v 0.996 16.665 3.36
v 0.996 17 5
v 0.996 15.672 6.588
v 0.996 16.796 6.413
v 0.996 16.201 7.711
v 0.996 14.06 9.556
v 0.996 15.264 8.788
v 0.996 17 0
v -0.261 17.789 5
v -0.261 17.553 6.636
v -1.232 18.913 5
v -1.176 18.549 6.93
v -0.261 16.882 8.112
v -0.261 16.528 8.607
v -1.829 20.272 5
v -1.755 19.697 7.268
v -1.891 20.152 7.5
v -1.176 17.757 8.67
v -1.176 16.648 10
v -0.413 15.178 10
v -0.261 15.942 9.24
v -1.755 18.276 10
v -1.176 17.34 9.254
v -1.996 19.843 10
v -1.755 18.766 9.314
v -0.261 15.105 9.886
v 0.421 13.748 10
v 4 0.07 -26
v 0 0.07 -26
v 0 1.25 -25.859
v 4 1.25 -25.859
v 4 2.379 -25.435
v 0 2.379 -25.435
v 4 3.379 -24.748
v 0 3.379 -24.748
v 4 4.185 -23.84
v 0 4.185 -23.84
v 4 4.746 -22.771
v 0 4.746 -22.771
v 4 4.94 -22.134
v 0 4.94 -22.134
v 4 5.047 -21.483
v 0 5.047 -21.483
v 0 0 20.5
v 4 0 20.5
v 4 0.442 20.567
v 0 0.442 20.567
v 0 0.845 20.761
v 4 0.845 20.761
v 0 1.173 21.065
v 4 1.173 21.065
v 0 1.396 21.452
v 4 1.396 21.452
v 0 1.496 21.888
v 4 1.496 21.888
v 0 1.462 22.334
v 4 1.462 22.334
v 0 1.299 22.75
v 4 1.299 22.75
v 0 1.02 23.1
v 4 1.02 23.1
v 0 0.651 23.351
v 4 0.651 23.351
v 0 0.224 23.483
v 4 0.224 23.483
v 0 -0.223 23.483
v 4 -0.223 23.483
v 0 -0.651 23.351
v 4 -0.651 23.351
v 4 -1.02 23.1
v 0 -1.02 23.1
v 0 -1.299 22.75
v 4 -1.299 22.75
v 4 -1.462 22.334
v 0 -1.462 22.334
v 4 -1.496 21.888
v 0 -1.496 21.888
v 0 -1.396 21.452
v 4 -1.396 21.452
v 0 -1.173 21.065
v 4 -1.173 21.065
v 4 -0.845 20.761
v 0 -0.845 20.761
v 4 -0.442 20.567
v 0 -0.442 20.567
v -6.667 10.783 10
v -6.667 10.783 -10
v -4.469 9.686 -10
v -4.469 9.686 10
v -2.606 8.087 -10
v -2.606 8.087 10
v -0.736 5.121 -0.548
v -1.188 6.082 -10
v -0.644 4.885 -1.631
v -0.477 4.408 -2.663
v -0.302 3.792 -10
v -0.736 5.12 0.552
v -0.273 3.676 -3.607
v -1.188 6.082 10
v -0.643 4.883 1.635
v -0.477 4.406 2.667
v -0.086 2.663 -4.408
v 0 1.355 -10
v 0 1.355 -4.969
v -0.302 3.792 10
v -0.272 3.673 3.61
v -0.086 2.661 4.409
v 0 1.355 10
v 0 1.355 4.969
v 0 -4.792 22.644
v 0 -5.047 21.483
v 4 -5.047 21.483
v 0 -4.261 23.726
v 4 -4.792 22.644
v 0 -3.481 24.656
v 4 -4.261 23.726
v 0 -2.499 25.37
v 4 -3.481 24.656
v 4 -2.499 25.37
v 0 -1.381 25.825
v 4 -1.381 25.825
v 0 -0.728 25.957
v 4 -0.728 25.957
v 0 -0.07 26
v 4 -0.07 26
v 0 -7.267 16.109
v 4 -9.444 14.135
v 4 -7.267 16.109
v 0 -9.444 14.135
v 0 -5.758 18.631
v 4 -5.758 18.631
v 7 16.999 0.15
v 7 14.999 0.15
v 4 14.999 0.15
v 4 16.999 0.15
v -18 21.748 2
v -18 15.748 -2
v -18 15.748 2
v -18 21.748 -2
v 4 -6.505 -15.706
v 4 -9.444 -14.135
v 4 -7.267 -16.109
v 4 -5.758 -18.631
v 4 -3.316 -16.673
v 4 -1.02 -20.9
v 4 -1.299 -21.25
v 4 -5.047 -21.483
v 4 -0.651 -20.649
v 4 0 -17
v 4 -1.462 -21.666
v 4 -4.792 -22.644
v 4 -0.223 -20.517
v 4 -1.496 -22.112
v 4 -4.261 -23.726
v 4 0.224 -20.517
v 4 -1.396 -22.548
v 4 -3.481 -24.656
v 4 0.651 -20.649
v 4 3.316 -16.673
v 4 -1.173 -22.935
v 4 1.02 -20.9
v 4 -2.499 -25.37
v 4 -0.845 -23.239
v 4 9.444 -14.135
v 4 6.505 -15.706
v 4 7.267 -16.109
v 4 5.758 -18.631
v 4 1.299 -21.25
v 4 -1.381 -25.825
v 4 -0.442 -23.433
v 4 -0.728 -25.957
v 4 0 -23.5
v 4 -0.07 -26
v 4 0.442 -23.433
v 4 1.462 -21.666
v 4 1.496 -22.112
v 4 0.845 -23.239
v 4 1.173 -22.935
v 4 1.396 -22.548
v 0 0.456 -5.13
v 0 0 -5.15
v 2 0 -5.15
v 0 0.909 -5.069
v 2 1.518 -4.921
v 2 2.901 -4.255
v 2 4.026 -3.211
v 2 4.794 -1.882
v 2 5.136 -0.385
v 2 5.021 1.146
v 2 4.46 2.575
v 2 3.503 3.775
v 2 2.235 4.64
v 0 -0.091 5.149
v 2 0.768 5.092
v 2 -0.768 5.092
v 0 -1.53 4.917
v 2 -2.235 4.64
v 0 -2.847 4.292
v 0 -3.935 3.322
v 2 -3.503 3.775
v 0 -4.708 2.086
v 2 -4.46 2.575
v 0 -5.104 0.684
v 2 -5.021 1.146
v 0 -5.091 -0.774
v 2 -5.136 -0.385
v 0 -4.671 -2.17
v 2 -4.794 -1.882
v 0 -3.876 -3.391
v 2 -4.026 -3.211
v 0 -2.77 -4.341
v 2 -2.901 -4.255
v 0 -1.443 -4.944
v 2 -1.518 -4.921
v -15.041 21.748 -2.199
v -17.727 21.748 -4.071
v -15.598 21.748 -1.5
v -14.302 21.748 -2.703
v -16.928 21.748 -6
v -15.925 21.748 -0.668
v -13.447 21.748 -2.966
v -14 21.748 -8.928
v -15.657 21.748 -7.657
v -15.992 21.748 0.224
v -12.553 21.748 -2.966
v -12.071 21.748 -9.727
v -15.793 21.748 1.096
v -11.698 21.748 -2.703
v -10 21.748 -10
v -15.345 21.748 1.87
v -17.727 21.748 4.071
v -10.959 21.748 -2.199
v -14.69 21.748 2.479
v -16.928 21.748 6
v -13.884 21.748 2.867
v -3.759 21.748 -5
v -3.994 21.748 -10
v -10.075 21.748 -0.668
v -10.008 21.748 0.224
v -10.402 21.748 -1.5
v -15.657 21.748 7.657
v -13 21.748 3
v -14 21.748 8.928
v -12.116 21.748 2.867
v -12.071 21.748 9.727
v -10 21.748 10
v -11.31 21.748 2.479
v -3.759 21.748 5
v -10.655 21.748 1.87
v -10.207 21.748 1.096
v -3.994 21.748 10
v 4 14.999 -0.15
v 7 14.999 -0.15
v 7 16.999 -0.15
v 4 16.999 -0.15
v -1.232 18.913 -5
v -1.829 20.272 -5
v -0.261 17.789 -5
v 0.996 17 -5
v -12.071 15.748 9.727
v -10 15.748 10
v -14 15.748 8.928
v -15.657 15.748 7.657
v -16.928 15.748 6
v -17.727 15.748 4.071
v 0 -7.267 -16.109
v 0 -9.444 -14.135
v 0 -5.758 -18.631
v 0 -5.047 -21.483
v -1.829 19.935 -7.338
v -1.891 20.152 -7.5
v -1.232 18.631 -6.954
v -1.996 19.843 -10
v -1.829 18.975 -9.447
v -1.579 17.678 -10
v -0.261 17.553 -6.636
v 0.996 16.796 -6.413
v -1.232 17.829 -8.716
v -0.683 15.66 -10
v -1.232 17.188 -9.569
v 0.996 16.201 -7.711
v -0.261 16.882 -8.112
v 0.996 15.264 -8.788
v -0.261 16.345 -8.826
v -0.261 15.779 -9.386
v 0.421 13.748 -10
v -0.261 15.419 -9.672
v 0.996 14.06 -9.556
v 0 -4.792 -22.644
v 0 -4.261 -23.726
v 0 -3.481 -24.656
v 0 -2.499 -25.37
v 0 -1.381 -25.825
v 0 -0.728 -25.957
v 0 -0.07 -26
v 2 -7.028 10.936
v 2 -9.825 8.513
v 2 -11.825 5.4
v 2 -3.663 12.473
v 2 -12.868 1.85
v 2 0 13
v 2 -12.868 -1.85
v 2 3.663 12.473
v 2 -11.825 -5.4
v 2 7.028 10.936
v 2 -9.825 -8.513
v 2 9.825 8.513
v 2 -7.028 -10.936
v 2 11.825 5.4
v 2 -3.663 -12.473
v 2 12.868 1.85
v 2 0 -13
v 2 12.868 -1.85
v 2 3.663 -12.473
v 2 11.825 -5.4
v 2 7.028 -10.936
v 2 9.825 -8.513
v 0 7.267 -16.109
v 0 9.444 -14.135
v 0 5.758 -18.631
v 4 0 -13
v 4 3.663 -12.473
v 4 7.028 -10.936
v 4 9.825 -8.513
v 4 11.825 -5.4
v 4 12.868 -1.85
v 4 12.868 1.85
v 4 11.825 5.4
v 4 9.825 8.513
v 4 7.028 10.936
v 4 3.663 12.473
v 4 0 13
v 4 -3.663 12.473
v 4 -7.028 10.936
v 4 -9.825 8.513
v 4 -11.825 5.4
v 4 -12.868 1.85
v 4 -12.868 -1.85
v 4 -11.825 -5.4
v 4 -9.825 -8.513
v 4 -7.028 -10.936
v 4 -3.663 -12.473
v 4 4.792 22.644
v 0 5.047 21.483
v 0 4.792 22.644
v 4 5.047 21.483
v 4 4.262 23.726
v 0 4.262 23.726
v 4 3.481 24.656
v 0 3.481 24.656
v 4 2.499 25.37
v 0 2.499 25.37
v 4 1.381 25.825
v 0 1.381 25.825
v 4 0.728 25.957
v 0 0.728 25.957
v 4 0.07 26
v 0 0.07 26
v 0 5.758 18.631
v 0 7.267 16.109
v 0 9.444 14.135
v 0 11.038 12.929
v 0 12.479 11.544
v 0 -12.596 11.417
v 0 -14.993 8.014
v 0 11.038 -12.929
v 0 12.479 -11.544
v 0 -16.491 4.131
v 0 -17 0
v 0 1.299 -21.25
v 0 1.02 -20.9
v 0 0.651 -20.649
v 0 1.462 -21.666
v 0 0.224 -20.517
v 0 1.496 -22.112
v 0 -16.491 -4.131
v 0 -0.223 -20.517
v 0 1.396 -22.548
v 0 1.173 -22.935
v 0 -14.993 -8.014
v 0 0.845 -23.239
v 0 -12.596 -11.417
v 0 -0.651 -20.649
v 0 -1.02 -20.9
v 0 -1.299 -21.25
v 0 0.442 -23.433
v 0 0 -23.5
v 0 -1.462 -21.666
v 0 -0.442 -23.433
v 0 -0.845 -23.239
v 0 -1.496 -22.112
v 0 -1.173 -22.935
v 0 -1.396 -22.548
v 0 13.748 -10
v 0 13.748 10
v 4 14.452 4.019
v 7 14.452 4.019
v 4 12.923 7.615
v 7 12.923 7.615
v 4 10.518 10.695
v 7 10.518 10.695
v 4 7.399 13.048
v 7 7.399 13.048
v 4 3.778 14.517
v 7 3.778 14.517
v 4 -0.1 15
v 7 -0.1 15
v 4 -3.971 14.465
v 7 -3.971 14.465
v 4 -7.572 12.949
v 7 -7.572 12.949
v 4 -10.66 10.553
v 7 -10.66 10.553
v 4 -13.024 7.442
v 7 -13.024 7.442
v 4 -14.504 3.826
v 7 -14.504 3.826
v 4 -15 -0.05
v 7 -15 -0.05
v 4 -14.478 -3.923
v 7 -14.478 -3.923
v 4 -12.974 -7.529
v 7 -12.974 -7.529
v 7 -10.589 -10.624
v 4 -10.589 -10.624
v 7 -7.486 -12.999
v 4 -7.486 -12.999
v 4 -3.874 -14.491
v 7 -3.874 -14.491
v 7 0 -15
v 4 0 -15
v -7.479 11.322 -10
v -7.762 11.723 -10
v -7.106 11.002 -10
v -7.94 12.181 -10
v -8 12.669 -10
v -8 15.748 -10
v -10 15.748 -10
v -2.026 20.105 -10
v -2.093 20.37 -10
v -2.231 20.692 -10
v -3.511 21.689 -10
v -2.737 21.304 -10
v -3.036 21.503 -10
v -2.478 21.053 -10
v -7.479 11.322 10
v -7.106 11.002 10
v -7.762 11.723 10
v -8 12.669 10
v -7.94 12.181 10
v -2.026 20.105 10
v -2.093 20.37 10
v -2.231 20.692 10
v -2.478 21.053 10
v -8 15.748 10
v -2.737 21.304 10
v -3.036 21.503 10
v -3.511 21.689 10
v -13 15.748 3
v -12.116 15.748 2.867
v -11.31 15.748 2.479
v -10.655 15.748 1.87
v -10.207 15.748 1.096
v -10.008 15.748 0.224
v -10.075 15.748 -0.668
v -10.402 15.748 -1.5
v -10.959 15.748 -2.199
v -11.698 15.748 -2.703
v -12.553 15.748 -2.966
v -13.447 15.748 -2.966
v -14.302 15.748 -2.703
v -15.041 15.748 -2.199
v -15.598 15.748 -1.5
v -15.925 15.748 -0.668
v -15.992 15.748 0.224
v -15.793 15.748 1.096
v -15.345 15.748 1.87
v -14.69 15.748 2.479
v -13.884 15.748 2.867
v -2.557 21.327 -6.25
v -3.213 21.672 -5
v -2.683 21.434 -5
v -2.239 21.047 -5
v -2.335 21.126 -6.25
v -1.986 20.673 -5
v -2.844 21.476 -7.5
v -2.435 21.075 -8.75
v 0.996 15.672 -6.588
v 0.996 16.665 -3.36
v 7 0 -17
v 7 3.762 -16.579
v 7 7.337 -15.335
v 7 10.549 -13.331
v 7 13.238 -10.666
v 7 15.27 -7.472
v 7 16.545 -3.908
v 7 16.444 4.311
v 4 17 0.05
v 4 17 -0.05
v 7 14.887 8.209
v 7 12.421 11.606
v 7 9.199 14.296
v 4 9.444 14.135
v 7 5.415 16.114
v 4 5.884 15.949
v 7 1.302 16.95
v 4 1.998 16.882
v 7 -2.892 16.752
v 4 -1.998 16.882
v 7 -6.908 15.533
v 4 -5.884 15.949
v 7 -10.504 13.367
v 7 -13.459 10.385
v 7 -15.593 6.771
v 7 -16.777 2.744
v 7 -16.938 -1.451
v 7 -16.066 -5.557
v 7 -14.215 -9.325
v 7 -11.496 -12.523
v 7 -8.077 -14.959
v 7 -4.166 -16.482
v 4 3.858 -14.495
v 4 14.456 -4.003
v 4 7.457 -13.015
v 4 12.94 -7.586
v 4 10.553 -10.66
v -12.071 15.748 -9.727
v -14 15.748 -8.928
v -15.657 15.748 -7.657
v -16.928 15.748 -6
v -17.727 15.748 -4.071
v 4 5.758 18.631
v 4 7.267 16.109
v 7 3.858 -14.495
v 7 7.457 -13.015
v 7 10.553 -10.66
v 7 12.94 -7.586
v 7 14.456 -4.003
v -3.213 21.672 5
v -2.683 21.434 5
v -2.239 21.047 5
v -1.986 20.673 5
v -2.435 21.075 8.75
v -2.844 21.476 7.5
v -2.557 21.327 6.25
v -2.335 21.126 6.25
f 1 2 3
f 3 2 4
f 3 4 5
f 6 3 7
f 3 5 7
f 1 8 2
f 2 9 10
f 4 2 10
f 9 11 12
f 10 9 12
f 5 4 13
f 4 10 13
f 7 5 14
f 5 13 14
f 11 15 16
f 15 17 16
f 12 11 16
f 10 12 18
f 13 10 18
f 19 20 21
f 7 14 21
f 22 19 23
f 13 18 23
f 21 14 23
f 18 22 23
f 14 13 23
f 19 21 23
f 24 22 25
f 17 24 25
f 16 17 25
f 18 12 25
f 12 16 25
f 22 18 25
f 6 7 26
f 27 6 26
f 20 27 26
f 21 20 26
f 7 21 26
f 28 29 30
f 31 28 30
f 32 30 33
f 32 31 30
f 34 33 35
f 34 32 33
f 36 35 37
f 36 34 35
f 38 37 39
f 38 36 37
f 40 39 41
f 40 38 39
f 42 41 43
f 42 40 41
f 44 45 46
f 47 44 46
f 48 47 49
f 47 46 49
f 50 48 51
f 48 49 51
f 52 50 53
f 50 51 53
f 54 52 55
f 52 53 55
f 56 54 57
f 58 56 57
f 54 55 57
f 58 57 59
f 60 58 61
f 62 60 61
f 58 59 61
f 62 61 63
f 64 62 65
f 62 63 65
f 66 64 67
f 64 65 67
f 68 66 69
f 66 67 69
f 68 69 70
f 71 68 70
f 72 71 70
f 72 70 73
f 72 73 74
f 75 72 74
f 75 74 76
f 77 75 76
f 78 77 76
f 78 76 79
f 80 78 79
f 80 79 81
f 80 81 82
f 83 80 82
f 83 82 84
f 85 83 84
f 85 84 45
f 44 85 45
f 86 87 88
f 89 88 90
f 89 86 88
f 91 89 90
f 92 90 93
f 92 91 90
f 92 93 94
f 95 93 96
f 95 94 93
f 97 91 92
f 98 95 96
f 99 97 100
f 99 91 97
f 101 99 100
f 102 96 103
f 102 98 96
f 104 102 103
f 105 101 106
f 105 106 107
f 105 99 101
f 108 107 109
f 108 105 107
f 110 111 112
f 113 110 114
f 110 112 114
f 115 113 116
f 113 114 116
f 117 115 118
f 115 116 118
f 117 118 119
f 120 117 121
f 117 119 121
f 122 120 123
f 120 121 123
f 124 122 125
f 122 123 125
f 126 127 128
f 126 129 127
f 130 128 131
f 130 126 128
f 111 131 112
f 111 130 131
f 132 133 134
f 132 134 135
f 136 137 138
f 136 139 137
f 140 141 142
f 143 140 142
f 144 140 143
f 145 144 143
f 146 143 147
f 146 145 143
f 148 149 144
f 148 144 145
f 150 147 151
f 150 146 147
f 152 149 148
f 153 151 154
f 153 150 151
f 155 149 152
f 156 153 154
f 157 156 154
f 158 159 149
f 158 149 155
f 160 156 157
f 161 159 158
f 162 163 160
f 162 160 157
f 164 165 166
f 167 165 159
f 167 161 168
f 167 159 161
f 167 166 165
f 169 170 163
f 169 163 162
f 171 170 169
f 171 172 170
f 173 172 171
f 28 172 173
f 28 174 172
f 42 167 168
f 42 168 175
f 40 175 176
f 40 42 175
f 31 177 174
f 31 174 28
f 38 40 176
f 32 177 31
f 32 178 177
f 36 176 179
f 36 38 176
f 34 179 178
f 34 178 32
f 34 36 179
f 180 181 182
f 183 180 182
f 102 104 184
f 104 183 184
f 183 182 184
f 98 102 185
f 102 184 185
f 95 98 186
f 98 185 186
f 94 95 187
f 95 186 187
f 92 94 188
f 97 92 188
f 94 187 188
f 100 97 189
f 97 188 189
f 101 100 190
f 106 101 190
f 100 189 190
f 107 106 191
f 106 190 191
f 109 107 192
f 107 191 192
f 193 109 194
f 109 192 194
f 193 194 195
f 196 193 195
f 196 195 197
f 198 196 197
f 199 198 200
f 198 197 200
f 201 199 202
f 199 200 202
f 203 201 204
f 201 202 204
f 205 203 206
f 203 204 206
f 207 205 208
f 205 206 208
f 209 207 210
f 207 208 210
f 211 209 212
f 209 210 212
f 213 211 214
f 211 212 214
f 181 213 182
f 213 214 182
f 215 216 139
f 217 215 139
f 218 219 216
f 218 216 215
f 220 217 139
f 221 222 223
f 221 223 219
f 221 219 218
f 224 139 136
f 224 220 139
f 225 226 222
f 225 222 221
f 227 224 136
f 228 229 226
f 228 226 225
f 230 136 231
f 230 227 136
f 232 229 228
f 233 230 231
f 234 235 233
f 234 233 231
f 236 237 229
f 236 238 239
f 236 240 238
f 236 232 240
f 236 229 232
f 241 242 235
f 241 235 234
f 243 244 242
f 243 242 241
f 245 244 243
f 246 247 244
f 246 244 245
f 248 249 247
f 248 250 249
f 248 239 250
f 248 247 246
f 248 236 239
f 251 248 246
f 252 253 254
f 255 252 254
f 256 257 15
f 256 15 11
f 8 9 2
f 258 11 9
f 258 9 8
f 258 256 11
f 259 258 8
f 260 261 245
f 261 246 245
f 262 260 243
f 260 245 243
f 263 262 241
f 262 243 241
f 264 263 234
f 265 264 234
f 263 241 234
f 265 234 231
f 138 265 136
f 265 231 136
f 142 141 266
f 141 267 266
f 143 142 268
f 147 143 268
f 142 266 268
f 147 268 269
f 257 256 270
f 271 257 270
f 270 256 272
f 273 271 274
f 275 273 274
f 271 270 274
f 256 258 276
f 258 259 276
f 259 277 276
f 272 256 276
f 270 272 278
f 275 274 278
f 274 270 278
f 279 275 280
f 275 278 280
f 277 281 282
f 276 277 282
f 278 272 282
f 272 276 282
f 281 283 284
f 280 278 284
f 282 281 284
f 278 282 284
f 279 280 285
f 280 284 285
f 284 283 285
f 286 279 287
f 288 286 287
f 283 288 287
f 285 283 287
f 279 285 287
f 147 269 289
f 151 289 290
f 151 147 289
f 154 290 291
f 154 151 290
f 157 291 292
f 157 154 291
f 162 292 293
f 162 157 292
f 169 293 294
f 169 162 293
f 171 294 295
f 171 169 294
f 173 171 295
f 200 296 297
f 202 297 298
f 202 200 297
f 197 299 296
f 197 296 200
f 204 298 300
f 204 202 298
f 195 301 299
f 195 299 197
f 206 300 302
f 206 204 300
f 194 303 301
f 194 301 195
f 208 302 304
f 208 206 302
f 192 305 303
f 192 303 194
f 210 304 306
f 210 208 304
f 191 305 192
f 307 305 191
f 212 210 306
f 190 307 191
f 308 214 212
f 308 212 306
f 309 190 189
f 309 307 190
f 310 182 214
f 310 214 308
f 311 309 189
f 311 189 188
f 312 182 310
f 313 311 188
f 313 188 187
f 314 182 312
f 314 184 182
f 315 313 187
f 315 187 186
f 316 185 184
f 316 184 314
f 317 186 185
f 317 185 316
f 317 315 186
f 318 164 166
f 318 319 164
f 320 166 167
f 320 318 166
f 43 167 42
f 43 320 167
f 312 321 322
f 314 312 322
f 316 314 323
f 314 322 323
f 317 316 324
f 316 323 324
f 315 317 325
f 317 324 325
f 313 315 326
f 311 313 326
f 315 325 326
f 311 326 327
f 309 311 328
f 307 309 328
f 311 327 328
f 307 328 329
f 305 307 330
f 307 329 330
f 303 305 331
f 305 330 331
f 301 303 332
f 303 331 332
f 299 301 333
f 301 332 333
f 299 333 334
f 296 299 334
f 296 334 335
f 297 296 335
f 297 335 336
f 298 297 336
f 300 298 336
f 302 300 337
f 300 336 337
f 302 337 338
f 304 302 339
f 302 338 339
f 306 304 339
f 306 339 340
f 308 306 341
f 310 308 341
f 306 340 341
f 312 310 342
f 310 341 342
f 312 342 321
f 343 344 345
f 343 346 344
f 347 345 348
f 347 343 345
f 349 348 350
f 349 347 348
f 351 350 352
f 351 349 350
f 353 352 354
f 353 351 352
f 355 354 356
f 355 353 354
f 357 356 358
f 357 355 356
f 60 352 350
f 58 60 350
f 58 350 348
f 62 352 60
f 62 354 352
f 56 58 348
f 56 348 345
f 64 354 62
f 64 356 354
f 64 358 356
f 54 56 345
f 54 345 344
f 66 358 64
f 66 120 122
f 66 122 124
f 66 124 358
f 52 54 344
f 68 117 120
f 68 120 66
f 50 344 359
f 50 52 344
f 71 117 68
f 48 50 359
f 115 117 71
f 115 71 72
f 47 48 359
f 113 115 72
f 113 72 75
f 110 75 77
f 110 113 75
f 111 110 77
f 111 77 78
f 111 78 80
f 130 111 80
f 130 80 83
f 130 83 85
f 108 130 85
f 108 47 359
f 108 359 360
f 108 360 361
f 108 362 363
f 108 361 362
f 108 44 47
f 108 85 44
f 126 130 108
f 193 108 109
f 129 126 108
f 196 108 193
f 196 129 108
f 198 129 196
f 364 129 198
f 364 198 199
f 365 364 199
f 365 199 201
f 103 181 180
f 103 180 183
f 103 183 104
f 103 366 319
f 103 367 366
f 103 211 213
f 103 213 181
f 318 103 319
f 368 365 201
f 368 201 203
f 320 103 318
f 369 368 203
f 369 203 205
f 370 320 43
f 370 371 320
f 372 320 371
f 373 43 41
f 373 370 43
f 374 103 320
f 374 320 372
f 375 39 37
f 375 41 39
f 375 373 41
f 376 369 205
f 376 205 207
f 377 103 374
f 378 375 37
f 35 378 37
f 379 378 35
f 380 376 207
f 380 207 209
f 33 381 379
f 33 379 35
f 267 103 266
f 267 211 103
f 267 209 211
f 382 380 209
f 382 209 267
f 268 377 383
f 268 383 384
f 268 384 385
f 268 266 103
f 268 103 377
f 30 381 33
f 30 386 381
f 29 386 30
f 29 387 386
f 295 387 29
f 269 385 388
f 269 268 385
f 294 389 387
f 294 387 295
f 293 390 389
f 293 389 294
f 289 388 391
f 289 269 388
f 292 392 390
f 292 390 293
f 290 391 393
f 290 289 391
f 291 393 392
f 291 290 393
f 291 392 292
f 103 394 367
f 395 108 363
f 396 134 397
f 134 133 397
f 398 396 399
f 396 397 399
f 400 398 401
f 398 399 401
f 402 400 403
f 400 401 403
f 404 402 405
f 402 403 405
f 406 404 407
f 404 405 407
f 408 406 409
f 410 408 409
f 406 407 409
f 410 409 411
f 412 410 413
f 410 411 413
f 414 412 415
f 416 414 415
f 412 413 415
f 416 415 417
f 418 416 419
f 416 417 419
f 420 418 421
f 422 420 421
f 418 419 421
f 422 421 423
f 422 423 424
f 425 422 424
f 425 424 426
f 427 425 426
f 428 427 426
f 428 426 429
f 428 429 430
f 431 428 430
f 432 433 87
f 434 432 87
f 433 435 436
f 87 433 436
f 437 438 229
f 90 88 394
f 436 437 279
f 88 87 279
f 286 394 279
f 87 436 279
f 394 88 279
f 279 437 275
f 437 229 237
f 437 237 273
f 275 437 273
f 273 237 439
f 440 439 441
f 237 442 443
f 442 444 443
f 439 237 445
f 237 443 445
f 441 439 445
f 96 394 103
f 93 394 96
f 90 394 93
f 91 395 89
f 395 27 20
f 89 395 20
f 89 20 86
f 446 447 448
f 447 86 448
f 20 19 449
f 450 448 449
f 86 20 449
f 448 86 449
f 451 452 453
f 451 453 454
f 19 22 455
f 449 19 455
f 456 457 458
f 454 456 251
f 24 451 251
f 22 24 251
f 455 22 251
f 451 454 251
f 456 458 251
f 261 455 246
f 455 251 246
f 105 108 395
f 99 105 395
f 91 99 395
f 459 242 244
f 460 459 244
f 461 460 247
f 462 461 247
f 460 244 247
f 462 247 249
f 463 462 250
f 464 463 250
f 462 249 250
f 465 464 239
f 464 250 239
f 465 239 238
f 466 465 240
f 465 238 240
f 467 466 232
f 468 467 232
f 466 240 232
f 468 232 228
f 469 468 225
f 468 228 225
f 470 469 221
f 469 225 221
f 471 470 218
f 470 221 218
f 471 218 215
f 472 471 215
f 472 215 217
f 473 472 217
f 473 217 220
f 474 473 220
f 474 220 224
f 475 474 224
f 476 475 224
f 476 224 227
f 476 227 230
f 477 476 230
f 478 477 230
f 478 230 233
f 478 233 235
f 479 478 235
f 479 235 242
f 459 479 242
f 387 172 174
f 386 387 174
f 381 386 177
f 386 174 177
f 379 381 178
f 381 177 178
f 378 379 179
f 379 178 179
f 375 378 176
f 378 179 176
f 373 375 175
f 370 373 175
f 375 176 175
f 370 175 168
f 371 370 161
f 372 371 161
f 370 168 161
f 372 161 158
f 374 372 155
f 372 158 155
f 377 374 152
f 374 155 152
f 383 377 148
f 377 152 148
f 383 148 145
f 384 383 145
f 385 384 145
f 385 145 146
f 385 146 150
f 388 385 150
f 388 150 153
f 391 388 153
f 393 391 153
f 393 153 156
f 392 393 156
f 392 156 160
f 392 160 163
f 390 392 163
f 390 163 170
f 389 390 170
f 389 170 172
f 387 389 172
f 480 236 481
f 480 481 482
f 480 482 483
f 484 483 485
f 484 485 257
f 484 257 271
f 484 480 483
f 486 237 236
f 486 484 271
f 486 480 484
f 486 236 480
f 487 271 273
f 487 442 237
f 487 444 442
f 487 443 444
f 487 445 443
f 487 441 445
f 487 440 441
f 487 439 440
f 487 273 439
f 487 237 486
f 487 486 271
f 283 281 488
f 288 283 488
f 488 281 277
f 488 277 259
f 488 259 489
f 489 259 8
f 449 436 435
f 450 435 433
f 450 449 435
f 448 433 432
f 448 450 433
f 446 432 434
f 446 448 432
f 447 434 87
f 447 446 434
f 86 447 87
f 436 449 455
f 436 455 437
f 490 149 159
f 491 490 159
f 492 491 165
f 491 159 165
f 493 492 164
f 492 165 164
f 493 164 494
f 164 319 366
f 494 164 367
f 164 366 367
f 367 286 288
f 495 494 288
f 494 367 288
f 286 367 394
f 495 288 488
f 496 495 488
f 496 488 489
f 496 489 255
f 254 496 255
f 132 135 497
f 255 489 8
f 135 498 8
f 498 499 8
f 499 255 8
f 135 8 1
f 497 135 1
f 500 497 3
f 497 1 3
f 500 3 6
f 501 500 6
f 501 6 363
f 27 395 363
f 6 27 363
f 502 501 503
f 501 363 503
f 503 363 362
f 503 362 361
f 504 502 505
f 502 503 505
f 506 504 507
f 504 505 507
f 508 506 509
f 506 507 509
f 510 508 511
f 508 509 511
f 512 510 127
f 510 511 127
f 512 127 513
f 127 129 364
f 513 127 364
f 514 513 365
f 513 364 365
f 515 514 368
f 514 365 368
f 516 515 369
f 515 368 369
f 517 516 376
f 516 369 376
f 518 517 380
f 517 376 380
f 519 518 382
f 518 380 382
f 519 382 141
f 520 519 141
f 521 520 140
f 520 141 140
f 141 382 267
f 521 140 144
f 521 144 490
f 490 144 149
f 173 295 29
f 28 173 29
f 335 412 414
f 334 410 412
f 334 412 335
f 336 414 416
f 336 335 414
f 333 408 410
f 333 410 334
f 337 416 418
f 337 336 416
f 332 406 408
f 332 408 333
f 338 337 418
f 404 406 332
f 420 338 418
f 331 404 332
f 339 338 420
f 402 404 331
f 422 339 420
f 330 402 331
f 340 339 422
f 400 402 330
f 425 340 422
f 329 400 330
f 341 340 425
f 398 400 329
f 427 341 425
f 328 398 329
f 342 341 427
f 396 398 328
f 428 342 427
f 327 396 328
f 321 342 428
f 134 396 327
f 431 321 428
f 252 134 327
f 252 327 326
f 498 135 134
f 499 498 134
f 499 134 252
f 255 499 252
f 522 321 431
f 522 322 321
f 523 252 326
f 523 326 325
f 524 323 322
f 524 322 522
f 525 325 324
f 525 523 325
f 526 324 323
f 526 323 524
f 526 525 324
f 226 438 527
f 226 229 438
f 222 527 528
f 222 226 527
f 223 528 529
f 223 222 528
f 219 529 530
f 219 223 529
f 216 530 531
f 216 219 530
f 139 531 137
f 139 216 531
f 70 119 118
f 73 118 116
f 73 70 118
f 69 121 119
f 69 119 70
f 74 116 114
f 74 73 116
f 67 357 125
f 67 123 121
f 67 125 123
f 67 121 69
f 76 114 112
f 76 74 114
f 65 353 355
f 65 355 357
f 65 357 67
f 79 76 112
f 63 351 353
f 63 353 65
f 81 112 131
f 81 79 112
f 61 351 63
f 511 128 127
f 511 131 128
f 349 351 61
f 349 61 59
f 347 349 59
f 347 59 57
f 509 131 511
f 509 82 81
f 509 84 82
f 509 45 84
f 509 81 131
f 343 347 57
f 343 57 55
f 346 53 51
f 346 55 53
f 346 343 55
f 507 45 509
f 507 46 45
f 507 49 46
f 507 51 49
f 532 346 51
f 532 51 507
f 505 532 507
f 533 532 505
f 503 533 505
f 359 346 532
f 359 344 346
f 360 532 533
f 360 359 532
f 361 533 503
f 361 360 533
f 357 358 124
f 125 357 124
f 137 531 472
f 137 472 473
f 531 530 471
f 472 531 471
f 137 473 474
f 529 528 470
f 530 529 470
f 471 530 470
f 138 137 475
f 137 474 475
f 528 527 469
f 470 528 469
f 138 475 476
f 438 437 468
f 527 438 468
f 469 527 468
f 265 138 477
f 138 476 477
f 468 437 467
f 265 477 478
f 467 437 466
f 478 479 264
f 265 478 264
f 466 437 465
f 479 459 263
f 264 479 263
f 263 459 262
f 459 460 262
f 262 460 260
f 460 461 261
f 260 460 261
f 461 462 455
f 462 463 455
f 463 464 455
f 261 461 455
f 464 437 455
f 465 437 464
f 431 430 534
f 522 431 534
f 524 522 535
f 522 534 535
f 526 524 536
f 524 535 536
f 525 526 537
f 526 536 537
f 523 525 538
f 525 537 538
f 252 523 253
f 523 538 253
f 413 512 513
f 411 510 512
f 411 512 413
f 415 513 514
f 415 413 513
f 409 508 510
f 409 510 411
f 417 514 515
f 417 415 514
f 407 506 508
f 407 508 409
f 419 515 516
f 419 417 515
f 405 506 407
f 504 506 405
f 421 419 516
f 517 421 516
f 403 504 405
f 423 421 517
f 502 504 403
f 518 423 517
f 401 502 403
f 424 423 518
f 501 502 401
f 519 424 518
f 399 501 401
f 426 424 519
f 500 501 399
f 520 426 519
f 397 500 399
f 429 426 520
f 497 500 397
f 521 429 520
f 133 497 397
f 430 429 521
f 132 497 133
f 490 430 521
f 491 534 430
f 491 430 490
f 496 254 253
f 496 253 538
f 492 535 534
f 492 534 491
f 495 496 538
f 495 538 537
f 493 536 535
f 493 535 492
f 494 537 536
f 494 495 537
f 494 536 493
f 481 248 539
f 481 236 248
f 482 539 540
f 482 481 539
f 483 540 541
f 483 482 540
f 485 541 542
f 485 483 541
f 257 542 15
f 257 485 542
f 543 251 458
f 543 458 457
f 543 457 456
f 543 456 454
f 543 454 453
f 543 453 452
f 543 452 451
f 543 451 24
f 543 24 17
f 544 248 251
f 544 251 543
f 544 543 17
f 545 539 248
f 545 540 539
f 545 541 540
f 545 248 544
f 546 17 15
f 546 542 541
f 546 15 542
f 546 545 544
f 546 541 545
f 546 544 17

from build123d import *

# Parameters (mm, degrees)
SKETCH_1_R          = 17
EXTRUDE_1_DEPTH     = 7
EXTRUDE_2_DEPTH     = 4
SKETCH_2_R          = 15
CUT_EXTRUDE_1_DEPTH = 3
CUT_EXTRUDE_2_REACH = 33.321
SKETCH_3_R          = 5.15
SKETCH_4_R          = 13
CUT_EXTRUDE_3_DEPTH = 2
CUT_EXTRUDE_4_REACH = 33.321
SKETCH_6_R          = 1.5
FILLET_1_R          = 10
FILLET_2_R          = 5
SKETCH_8_W          = 0.3
SKETCH_8_H          = 2.22932804
CUT_EXTRUDE_5_DEPTH = 3
SKETCH_9_W          = 20
SKETCH_9_H          = 2.594823192
EXTRUDE_3_DEPTH     = 8
SKETCH_10_W         = 5.99596414
SKETCH_10_H         = 20
EXTRUDE_4_DEPTH     = 8
SKETCH_11_W         = 20
SKETCH_11_H         = 6
EXTRUDE_5_DEPTH     = 10
SKETCH_12_R         = 3
CUT_EXTRUDE_6_DEPTH = 10
FILLET_3_R          = 10
EXTRUDE_6_DEPTH     = 3
FILLET_5_R          = 5
FILLET_6_R          = 5
FILLET_7_R          = 8
FILLET_9_R          = 2


with BuildPart() as part:
    # 草图1 → 凸台-拉伸1 (new body)
    with BuildSketch(Plane(origin=(0, 0, 0), x_dir=(0, 0, -1), z_dir=(1, 0, 0))):
        Circle(SKETCH_1_R)
    extrude(amount=EXTRUDE_1_DEPTH)

    # 草图5 → 凸台-拉伸2 (add)
    with BuildSketch(Plane.ZY):
        Polygon((0, 5.000073493), (26, 5.000073493), (26, -4.999926507), (11, -4.999926507), (-26, -4.999926507), (-26, 5.000073493), align=None)
    extrude(amount=-EXTRUDE_2_DEPTH)

    # 草图2 → 切除-拉伸1 (cut)
    with BuildSketch(Plane(origin=(7, 0, 0), x_dir=(0, 0, -1), z_dir=(1, 0, 0))):
        Circle(SKETCH_2_R)
    extrude(amount=-CUT_EXTRUDE_1_DEPTH, mode=Mode.SUBTRACT)

    # 草图3 → 切除-拉伸2 (cut, up to next)
    with BuildSketch(Plane(origin=(4, 0, 0), x_dir=(0, 0, -1), z_dir=(1, 0, 0)), mode=Mode.PRIVATE) as cut_extrude_2_sk1:
        Circle(SKETCH_3_R)
    cut_extrude_2_tool1 = extrude(cut_extrude_2_sk1.sketch, amount=-CUT_EXTRUDE_2_REACH, mode=Mode.PRIVATE) & part.part
    add(cut_extrude_2_tool1.solids().sort_by_distance((4, 0, 0))[0], mode=Mode.SUBTRACT)

    # 草图4 → 切除-拉伸3 (cut)
    with BuildSketch(Plane(origin=(4, 0, 0), x_dir=(0, 0, -1), z_dir=(1, 0, 0))):
        Circle(SKETCH_4_R)
    extrude(amount=-CUT_EXTRUDE_3_DEPTH, mode=Mode.SUBTRACT)

    # 草图6 → 切除-拉伸4 (cut, up to next)
    with BuildSketch(Plane(origin=(4, 0, 0), x_dir=(0, 0, -1), z_dir=(1, 0, 0)), mode=Mode.PRIVATE) as cut_extrude_4_sk1:
        with Locations((-22, 7.3493e-05)):
            Circle(SKETCH_6_R)
    cut_extrude_4_tool1 = extrude(cut_extrude_4_sk1.sketch, amount=-CUT_EXTRUDE_4_REACH, mode=Mode.PRIVATE) & part.part
    # 草图6 → 切除-拉伸4 (cut, up to next)
    with BuildSketch(Plane(origin=(4, 0, 0), x_dir=(0, 0, -1), z_dir=(1, 0, 0)), mode=Mode.PRIVATE) as cut_extrude_4_sk2:
        with Locations((22, 7.3493e-05)):
            Circle(SKETCH_6_R)
    cut_extrude_4_tool2 = extrude(cut_extrude_4_sk2.sketch, amount=-CUT_EXTRUDE_4_REACH, mode=Mode.PRIVATE) & part.part
    add(cut_extrude_4_tool1.solids().sort_by_distance((4, 7.3e-05, 22))[0], mode=Mode.SUBTRACT)
    add(cut_extrude_4_tool2.solids().sort_by_distance((4, 7.3e-05, -22))[0], mode=Mode.SUBTRACT)

    # 圆角1
    fillet_1_edges = [part.edges().sort_by_distance(p)[0] for p in [
        (2, 5.000073493, -16.248054193),
        (2, 5.000073493, 16.248054193),
        (2, -4.999926507, 16.248099425),
        (2, -4.999926507, -16.248099425),
    ]]
    fillet(fillet_1_edges, radius=FILLET_1_R)

    # 圆角2
    fillet_2_edges = [part.edges().sort_by_distance(p)[0] for p in [
        (2, 5.000073493, 26),
        (2, -4.999926507, 26),
        (2, -4.999926507, -26),
        (2, 5.000073493, -26),
    ]]
    fillet(fillet_2_edges, radius=FILLET_2_R)

    # 草图8 → 切除-拉伸5 (cut)
    with BuildSketch(Plane(origin=(7, 0, 0), x_dir=(0, 0, -1), z_dir=(1, 0, 0))):
        with Locations((0, 16.113914001)):
            Rectangle(SKETCH_8_W, SKETCH_8_H)
    extrude(amount=-CUT_EXTRUDE_5_DEPTH, mode=Mode.SUBTRACT)

    # 草图9 → 凸台-拉伸3 (add)
    with BuildSketch(Plane.ZY):
        with Locations((0, 12.450315489)):
            Rectangle(SKETCH_9_W, SKETCH_9_H)
    extrude(amount=EXTRUDE_3_DEPTH)

    # 草图10 → 凸台-拉伸4 (add)
    with BuildSketch(Plane(origin=(0, 13.747727085, 0), x_dir=(1, 0, 0), z_dir=(0, 1, 0))):
        with Locations((-5.00201793, 0)):
            Rectangle(SKETCH_10_W, SKETCH_10_H)
    extrude(amount=EXTRUDE_4_DEPTH)

    # 草图11 → 凸台-拉伸5 (add)
    with BuildSketch(Plane.ZY.offset(8)):
        with Locations((0, 18.747727085)):
            Rectangle(SKETCH_11_W, SKETCH_11_H)
    extrude(amount=EXTRUDE_5_DEPTH)

    # 草图12 → 切除-拉伸6 (cut)
    with BuildSketch(Plane(origin=(0, 21.747727085, 0), x_dir=(1, 0, 0), z_dir=(0, 1, 0))):
        with Locations(Location((-13, 0, 0), (0, 0, 270))):
            Circle(SKETCH_12_R)
    extrude(amount=-CUT_EXTRUDE_6_DEPTH, mode=Mode.SUBTRACT)

    # 圆角3
    # the kernel refuses this fillet: 10 mm, written as the material it adds along each edge
    with BuildSketch(Plane(origin=(0, 11.152903893, 10), x_dir=(0, -1, 0), z_dir=(0, 0, -1))) as fillet_3_piece_1_section:
        with BuildLine():
            CenterArc((9.797958971, 10), FILLET_3_R, 191.536959033, 78.463040967)
            Line((0, 8), (0, 0))
            Line((0, 0), (9.797958971, 0))
        make_face()
    fillet_3_piece_1 = extrude(amount=20, mode=Mode.PRIVATE)
    fillet_3_piece_1 = fillet_3_piece_1 - Plane(origin=(0, 0, 0), x_dir=(0, 0, -1), z_dir=(1, 0, 0)) * Cylinder(5.15, 80, mode=Mode.PRIVATE)
    add(fillet_3_piece_1)

    # 草图13 → 凸台-拉伸6 (add)
    with BuildSketch(Plane(origin=(-2.00403586, 0, 0), x_dir=(0, 0, -1), z_dir=(1, 0, 0))):
        Polygon((0, 17), (10, 17), (10, 13.747727085), (-10, 13.747727085), (-10, 17), align=None)
    extrude(amount=EXTRUDE_6_DEPTH)

    # 圆角5
    # the kernel refuses this fillet: 5 mm, written as the material it takes off along each edge
    with BuildSketch(Plane(origin=(-2.00403586, 17, -10), x_dir=(0, -1, 0), z_dir=(1, 0, 0))) as fillet_5_piece_1_section:
        with BuildLine():
            CenterArc((FILLET_5_R, -FILLET_5_R), FILLET_5_R, 90, 90)
            Line((0, -FILLET_5_R), (0, 0))
            Line((0, 0), (FILLET_5_R, 0))
        make_face()
    fillet_5_piece_1 = extrude(amount=15.5, mode=Mode.PRIVATE)
    fillet_5_piece_1 = split(fillet_5_piece_1, bisect_by=Plane(origin=(0, 17, -10), z_dir=(-1, 0, 0)), keep=Keep.TOP, mode=Mode.PRIVATE)
    add(fillet_5_piece_1, mode=Mode.SUBTRACT)
    with BuildSketch(Plane(origin=(-2.00403586, 17, -10), x_dir=(0, -1, 0), z_dir=(1, 0, 0))) as fillet_5_piece_2_section:
        with BuildLine():
            CenterArc((FILLET_5_R, -FILLET_5_R), FILLET_5_R, 90, 90)
            Line((0, -FILLET_5_R), (0, 0))
            Line((0, 0), (FILLET_5_R, 0))
        make_face()
    fillet_5_piece_2 = extrude(amount=15.5, mode=Mode.PRIVATE)
    fillet_5_piece_2 = fillet_5_piece_2 - Plane(origin=(-2.00403586, 0, 0), x_dir=(0, 0, -1), z_dir=(-1, 0, 0)) * Cylinder(17, 51, mode=Mode.PRIVATE)
    add(fillet_5_piece_2, mode=Mode.SUBTRACT)
    with BuildSketch(Plane(origin=(-2.00403586, 17, 10), x_dir=(0, -1, 0), z_dir=(1, 0, 0))) as fillet_5_piece_3_section:
        with BuildLine():
            CenterArc((FILLET_5_R, FILLET_5_R), FILLET_5_R, 180, 90)
            Line((0, FILLET_5_R), (0, 0))
            Line((0, 0), (FILLET_5_R, 0))
        make_face()
    fillet_5_piece_3 = extrude(amount=15.5, mode=Mode.PRIVATE)
    fillet_5_piece_3 = split(fillet_5_piece_3, bisect_by=Plane(origin=(0, 17, 10), z_dir=(-1, 0, 0)), keep=Keep.TOP, mode=Mode.PRIVATE)
    add(fillet_5_piece_3, mode=Mode.SUBTRACT)
    with BuildSketch(Plane(origin=(-2.00403586, 17, 10), x_dir=(0, -1, 0), z_dir=(1, 0, 0))) as fillet_5_piece_4_section:
        with BuildLine():
            CenterArc((FILLET_5_R, FILLET_5_R), FILLET_5_R, 180, 90)
            Line((0, FILLET_5_R), (0, 0))
            Line((0, 0), (FILLET_5_R, 0))
        make_face()
    fillet_5_piece_4 = extrude(amount=15.5, mode=Mode.PRIVATE)
    fillet_5_piece_4 = fillet_5_piece_4 - Plane(origin=(-2.00403586, 0, 0), x_dir=(0, 0, -1), z_dir=(-1, 0, 0)) * Cylinder(17, 51, mode=Mode.PRIVATE)
    add(fillet_5_piece_4, mode=Mode.SUBTRACT)

    # 圆角6
    # the kernel refuses this fillet: 5 mm, written as the material it adds along each edge
    with BuildSketch(Plane(origin=(-2.00403586, 12, -5), x_dir=(0, 1, 0), z_dir=(0, 0, 1))) as fillet_6_piece_1_section:
        with BuildLine():
            CenterArc((9.582575695, -5), FILLET_6_R, 90, 66.421821522)
            Line((5, -3), (5, 0))
            Line((5, 0), (9.582575695, 0))
        make_face()
    fillet_6_piece_1 = revolve(axis=Axis((-2.00403586, 12, -5), (-1, 0, 0)), revolution_arc=221.333860008, mode=Mode.PRIVATE)
    fillet_6_piece_1 = fillet_6_piece_1 - Plane(origin=(-10, 1.354944922, -5), x_dir=(0, -1, 0), z_dir=(0, 0, 1)) * Cylinder(10, 39, mode=Mode.PRIVATE)
    fillet_6_piece_1 = split(fillet_6_piece_1, bisect_by=Plane(origin=(-2.00403586, 12, -10), z_dir=(0, 0, 1)), keep=Keep.TOP, mode=Mode.PRIVATE)
    add(fillet_6_piece_1)
    with BuildSketch(Plane(origin=(-2.00403586, 12, 5), x_dir=(0, 1, 0), z_dir=(0, 0, -1))) as fillet_6_piece_2_section:
        with BuildLine():
            CenterArc((9.582575695, 5), FILLET_6_R, 203.578178478, 66.421821522)
            Line((5, 3), (5, 0))
            Line((5, 0), (9.582575695, 0))
        make_face()
    fillet_6_piece_2 = revolve(axis=Axis((-2.00403586, 12, 5), (1, 0, 0)), revolution_arc=221.333860008, mode=Mode.PRIVATE)
    fillet_6_piece_2 = fillet_6_piece_2 - Plane(origin=(-10, 1.354944922, 5), x_dir=(0, -1, 0), z_dir=(0, 0, 1)) * Cylinder(10, 39, mode=Mode.PRIVATE)
    fillet_6_piece_2 = split(fillet_6_piece_2, bisect_by=Plane(origin=(-2.00403586, 12, 10), z_dir=(0, 0, -1)), keep=Keep.TOP, mode=Mode.PRIVATE)
    add(fillet_6_piece_2)
    with BuildSketch(Plane(origin=(-2.00403586, 17, -5), x_dir=(0, 1, 0), z_dir=(0, 0, 1))) as fillet_6_piece_3:
        with BuildLine():
            CenterArc((4.582575695, -5), FILLET_6_R, 90, 66.421821522)
            Line((0, -3), (0, 0))
            Line((0, 0), (4.582575695, 0))
        make_face()
    extrude(amount=10)

    # 圆角7
    fillet_7_edges = [part.edges().sort_by_distance(p)[0] for p in [
        (-18, 18.747727085, -10),
        (-18, 18.747727085, 10),
    ]]
    fillet(fillet_7_edges, radius=FILLET_7_R)

    # 圆角9
    fillet_9_edges = [part.edges().sort_by_distance(p)[0] for p in [
        (-2.00403586, 21.747727085, 0),
        (-8, 11.152903893, 0),
    ]]
    fillet(fillet_9_edges, radius=FILLET_9_R)


solid = part.part
